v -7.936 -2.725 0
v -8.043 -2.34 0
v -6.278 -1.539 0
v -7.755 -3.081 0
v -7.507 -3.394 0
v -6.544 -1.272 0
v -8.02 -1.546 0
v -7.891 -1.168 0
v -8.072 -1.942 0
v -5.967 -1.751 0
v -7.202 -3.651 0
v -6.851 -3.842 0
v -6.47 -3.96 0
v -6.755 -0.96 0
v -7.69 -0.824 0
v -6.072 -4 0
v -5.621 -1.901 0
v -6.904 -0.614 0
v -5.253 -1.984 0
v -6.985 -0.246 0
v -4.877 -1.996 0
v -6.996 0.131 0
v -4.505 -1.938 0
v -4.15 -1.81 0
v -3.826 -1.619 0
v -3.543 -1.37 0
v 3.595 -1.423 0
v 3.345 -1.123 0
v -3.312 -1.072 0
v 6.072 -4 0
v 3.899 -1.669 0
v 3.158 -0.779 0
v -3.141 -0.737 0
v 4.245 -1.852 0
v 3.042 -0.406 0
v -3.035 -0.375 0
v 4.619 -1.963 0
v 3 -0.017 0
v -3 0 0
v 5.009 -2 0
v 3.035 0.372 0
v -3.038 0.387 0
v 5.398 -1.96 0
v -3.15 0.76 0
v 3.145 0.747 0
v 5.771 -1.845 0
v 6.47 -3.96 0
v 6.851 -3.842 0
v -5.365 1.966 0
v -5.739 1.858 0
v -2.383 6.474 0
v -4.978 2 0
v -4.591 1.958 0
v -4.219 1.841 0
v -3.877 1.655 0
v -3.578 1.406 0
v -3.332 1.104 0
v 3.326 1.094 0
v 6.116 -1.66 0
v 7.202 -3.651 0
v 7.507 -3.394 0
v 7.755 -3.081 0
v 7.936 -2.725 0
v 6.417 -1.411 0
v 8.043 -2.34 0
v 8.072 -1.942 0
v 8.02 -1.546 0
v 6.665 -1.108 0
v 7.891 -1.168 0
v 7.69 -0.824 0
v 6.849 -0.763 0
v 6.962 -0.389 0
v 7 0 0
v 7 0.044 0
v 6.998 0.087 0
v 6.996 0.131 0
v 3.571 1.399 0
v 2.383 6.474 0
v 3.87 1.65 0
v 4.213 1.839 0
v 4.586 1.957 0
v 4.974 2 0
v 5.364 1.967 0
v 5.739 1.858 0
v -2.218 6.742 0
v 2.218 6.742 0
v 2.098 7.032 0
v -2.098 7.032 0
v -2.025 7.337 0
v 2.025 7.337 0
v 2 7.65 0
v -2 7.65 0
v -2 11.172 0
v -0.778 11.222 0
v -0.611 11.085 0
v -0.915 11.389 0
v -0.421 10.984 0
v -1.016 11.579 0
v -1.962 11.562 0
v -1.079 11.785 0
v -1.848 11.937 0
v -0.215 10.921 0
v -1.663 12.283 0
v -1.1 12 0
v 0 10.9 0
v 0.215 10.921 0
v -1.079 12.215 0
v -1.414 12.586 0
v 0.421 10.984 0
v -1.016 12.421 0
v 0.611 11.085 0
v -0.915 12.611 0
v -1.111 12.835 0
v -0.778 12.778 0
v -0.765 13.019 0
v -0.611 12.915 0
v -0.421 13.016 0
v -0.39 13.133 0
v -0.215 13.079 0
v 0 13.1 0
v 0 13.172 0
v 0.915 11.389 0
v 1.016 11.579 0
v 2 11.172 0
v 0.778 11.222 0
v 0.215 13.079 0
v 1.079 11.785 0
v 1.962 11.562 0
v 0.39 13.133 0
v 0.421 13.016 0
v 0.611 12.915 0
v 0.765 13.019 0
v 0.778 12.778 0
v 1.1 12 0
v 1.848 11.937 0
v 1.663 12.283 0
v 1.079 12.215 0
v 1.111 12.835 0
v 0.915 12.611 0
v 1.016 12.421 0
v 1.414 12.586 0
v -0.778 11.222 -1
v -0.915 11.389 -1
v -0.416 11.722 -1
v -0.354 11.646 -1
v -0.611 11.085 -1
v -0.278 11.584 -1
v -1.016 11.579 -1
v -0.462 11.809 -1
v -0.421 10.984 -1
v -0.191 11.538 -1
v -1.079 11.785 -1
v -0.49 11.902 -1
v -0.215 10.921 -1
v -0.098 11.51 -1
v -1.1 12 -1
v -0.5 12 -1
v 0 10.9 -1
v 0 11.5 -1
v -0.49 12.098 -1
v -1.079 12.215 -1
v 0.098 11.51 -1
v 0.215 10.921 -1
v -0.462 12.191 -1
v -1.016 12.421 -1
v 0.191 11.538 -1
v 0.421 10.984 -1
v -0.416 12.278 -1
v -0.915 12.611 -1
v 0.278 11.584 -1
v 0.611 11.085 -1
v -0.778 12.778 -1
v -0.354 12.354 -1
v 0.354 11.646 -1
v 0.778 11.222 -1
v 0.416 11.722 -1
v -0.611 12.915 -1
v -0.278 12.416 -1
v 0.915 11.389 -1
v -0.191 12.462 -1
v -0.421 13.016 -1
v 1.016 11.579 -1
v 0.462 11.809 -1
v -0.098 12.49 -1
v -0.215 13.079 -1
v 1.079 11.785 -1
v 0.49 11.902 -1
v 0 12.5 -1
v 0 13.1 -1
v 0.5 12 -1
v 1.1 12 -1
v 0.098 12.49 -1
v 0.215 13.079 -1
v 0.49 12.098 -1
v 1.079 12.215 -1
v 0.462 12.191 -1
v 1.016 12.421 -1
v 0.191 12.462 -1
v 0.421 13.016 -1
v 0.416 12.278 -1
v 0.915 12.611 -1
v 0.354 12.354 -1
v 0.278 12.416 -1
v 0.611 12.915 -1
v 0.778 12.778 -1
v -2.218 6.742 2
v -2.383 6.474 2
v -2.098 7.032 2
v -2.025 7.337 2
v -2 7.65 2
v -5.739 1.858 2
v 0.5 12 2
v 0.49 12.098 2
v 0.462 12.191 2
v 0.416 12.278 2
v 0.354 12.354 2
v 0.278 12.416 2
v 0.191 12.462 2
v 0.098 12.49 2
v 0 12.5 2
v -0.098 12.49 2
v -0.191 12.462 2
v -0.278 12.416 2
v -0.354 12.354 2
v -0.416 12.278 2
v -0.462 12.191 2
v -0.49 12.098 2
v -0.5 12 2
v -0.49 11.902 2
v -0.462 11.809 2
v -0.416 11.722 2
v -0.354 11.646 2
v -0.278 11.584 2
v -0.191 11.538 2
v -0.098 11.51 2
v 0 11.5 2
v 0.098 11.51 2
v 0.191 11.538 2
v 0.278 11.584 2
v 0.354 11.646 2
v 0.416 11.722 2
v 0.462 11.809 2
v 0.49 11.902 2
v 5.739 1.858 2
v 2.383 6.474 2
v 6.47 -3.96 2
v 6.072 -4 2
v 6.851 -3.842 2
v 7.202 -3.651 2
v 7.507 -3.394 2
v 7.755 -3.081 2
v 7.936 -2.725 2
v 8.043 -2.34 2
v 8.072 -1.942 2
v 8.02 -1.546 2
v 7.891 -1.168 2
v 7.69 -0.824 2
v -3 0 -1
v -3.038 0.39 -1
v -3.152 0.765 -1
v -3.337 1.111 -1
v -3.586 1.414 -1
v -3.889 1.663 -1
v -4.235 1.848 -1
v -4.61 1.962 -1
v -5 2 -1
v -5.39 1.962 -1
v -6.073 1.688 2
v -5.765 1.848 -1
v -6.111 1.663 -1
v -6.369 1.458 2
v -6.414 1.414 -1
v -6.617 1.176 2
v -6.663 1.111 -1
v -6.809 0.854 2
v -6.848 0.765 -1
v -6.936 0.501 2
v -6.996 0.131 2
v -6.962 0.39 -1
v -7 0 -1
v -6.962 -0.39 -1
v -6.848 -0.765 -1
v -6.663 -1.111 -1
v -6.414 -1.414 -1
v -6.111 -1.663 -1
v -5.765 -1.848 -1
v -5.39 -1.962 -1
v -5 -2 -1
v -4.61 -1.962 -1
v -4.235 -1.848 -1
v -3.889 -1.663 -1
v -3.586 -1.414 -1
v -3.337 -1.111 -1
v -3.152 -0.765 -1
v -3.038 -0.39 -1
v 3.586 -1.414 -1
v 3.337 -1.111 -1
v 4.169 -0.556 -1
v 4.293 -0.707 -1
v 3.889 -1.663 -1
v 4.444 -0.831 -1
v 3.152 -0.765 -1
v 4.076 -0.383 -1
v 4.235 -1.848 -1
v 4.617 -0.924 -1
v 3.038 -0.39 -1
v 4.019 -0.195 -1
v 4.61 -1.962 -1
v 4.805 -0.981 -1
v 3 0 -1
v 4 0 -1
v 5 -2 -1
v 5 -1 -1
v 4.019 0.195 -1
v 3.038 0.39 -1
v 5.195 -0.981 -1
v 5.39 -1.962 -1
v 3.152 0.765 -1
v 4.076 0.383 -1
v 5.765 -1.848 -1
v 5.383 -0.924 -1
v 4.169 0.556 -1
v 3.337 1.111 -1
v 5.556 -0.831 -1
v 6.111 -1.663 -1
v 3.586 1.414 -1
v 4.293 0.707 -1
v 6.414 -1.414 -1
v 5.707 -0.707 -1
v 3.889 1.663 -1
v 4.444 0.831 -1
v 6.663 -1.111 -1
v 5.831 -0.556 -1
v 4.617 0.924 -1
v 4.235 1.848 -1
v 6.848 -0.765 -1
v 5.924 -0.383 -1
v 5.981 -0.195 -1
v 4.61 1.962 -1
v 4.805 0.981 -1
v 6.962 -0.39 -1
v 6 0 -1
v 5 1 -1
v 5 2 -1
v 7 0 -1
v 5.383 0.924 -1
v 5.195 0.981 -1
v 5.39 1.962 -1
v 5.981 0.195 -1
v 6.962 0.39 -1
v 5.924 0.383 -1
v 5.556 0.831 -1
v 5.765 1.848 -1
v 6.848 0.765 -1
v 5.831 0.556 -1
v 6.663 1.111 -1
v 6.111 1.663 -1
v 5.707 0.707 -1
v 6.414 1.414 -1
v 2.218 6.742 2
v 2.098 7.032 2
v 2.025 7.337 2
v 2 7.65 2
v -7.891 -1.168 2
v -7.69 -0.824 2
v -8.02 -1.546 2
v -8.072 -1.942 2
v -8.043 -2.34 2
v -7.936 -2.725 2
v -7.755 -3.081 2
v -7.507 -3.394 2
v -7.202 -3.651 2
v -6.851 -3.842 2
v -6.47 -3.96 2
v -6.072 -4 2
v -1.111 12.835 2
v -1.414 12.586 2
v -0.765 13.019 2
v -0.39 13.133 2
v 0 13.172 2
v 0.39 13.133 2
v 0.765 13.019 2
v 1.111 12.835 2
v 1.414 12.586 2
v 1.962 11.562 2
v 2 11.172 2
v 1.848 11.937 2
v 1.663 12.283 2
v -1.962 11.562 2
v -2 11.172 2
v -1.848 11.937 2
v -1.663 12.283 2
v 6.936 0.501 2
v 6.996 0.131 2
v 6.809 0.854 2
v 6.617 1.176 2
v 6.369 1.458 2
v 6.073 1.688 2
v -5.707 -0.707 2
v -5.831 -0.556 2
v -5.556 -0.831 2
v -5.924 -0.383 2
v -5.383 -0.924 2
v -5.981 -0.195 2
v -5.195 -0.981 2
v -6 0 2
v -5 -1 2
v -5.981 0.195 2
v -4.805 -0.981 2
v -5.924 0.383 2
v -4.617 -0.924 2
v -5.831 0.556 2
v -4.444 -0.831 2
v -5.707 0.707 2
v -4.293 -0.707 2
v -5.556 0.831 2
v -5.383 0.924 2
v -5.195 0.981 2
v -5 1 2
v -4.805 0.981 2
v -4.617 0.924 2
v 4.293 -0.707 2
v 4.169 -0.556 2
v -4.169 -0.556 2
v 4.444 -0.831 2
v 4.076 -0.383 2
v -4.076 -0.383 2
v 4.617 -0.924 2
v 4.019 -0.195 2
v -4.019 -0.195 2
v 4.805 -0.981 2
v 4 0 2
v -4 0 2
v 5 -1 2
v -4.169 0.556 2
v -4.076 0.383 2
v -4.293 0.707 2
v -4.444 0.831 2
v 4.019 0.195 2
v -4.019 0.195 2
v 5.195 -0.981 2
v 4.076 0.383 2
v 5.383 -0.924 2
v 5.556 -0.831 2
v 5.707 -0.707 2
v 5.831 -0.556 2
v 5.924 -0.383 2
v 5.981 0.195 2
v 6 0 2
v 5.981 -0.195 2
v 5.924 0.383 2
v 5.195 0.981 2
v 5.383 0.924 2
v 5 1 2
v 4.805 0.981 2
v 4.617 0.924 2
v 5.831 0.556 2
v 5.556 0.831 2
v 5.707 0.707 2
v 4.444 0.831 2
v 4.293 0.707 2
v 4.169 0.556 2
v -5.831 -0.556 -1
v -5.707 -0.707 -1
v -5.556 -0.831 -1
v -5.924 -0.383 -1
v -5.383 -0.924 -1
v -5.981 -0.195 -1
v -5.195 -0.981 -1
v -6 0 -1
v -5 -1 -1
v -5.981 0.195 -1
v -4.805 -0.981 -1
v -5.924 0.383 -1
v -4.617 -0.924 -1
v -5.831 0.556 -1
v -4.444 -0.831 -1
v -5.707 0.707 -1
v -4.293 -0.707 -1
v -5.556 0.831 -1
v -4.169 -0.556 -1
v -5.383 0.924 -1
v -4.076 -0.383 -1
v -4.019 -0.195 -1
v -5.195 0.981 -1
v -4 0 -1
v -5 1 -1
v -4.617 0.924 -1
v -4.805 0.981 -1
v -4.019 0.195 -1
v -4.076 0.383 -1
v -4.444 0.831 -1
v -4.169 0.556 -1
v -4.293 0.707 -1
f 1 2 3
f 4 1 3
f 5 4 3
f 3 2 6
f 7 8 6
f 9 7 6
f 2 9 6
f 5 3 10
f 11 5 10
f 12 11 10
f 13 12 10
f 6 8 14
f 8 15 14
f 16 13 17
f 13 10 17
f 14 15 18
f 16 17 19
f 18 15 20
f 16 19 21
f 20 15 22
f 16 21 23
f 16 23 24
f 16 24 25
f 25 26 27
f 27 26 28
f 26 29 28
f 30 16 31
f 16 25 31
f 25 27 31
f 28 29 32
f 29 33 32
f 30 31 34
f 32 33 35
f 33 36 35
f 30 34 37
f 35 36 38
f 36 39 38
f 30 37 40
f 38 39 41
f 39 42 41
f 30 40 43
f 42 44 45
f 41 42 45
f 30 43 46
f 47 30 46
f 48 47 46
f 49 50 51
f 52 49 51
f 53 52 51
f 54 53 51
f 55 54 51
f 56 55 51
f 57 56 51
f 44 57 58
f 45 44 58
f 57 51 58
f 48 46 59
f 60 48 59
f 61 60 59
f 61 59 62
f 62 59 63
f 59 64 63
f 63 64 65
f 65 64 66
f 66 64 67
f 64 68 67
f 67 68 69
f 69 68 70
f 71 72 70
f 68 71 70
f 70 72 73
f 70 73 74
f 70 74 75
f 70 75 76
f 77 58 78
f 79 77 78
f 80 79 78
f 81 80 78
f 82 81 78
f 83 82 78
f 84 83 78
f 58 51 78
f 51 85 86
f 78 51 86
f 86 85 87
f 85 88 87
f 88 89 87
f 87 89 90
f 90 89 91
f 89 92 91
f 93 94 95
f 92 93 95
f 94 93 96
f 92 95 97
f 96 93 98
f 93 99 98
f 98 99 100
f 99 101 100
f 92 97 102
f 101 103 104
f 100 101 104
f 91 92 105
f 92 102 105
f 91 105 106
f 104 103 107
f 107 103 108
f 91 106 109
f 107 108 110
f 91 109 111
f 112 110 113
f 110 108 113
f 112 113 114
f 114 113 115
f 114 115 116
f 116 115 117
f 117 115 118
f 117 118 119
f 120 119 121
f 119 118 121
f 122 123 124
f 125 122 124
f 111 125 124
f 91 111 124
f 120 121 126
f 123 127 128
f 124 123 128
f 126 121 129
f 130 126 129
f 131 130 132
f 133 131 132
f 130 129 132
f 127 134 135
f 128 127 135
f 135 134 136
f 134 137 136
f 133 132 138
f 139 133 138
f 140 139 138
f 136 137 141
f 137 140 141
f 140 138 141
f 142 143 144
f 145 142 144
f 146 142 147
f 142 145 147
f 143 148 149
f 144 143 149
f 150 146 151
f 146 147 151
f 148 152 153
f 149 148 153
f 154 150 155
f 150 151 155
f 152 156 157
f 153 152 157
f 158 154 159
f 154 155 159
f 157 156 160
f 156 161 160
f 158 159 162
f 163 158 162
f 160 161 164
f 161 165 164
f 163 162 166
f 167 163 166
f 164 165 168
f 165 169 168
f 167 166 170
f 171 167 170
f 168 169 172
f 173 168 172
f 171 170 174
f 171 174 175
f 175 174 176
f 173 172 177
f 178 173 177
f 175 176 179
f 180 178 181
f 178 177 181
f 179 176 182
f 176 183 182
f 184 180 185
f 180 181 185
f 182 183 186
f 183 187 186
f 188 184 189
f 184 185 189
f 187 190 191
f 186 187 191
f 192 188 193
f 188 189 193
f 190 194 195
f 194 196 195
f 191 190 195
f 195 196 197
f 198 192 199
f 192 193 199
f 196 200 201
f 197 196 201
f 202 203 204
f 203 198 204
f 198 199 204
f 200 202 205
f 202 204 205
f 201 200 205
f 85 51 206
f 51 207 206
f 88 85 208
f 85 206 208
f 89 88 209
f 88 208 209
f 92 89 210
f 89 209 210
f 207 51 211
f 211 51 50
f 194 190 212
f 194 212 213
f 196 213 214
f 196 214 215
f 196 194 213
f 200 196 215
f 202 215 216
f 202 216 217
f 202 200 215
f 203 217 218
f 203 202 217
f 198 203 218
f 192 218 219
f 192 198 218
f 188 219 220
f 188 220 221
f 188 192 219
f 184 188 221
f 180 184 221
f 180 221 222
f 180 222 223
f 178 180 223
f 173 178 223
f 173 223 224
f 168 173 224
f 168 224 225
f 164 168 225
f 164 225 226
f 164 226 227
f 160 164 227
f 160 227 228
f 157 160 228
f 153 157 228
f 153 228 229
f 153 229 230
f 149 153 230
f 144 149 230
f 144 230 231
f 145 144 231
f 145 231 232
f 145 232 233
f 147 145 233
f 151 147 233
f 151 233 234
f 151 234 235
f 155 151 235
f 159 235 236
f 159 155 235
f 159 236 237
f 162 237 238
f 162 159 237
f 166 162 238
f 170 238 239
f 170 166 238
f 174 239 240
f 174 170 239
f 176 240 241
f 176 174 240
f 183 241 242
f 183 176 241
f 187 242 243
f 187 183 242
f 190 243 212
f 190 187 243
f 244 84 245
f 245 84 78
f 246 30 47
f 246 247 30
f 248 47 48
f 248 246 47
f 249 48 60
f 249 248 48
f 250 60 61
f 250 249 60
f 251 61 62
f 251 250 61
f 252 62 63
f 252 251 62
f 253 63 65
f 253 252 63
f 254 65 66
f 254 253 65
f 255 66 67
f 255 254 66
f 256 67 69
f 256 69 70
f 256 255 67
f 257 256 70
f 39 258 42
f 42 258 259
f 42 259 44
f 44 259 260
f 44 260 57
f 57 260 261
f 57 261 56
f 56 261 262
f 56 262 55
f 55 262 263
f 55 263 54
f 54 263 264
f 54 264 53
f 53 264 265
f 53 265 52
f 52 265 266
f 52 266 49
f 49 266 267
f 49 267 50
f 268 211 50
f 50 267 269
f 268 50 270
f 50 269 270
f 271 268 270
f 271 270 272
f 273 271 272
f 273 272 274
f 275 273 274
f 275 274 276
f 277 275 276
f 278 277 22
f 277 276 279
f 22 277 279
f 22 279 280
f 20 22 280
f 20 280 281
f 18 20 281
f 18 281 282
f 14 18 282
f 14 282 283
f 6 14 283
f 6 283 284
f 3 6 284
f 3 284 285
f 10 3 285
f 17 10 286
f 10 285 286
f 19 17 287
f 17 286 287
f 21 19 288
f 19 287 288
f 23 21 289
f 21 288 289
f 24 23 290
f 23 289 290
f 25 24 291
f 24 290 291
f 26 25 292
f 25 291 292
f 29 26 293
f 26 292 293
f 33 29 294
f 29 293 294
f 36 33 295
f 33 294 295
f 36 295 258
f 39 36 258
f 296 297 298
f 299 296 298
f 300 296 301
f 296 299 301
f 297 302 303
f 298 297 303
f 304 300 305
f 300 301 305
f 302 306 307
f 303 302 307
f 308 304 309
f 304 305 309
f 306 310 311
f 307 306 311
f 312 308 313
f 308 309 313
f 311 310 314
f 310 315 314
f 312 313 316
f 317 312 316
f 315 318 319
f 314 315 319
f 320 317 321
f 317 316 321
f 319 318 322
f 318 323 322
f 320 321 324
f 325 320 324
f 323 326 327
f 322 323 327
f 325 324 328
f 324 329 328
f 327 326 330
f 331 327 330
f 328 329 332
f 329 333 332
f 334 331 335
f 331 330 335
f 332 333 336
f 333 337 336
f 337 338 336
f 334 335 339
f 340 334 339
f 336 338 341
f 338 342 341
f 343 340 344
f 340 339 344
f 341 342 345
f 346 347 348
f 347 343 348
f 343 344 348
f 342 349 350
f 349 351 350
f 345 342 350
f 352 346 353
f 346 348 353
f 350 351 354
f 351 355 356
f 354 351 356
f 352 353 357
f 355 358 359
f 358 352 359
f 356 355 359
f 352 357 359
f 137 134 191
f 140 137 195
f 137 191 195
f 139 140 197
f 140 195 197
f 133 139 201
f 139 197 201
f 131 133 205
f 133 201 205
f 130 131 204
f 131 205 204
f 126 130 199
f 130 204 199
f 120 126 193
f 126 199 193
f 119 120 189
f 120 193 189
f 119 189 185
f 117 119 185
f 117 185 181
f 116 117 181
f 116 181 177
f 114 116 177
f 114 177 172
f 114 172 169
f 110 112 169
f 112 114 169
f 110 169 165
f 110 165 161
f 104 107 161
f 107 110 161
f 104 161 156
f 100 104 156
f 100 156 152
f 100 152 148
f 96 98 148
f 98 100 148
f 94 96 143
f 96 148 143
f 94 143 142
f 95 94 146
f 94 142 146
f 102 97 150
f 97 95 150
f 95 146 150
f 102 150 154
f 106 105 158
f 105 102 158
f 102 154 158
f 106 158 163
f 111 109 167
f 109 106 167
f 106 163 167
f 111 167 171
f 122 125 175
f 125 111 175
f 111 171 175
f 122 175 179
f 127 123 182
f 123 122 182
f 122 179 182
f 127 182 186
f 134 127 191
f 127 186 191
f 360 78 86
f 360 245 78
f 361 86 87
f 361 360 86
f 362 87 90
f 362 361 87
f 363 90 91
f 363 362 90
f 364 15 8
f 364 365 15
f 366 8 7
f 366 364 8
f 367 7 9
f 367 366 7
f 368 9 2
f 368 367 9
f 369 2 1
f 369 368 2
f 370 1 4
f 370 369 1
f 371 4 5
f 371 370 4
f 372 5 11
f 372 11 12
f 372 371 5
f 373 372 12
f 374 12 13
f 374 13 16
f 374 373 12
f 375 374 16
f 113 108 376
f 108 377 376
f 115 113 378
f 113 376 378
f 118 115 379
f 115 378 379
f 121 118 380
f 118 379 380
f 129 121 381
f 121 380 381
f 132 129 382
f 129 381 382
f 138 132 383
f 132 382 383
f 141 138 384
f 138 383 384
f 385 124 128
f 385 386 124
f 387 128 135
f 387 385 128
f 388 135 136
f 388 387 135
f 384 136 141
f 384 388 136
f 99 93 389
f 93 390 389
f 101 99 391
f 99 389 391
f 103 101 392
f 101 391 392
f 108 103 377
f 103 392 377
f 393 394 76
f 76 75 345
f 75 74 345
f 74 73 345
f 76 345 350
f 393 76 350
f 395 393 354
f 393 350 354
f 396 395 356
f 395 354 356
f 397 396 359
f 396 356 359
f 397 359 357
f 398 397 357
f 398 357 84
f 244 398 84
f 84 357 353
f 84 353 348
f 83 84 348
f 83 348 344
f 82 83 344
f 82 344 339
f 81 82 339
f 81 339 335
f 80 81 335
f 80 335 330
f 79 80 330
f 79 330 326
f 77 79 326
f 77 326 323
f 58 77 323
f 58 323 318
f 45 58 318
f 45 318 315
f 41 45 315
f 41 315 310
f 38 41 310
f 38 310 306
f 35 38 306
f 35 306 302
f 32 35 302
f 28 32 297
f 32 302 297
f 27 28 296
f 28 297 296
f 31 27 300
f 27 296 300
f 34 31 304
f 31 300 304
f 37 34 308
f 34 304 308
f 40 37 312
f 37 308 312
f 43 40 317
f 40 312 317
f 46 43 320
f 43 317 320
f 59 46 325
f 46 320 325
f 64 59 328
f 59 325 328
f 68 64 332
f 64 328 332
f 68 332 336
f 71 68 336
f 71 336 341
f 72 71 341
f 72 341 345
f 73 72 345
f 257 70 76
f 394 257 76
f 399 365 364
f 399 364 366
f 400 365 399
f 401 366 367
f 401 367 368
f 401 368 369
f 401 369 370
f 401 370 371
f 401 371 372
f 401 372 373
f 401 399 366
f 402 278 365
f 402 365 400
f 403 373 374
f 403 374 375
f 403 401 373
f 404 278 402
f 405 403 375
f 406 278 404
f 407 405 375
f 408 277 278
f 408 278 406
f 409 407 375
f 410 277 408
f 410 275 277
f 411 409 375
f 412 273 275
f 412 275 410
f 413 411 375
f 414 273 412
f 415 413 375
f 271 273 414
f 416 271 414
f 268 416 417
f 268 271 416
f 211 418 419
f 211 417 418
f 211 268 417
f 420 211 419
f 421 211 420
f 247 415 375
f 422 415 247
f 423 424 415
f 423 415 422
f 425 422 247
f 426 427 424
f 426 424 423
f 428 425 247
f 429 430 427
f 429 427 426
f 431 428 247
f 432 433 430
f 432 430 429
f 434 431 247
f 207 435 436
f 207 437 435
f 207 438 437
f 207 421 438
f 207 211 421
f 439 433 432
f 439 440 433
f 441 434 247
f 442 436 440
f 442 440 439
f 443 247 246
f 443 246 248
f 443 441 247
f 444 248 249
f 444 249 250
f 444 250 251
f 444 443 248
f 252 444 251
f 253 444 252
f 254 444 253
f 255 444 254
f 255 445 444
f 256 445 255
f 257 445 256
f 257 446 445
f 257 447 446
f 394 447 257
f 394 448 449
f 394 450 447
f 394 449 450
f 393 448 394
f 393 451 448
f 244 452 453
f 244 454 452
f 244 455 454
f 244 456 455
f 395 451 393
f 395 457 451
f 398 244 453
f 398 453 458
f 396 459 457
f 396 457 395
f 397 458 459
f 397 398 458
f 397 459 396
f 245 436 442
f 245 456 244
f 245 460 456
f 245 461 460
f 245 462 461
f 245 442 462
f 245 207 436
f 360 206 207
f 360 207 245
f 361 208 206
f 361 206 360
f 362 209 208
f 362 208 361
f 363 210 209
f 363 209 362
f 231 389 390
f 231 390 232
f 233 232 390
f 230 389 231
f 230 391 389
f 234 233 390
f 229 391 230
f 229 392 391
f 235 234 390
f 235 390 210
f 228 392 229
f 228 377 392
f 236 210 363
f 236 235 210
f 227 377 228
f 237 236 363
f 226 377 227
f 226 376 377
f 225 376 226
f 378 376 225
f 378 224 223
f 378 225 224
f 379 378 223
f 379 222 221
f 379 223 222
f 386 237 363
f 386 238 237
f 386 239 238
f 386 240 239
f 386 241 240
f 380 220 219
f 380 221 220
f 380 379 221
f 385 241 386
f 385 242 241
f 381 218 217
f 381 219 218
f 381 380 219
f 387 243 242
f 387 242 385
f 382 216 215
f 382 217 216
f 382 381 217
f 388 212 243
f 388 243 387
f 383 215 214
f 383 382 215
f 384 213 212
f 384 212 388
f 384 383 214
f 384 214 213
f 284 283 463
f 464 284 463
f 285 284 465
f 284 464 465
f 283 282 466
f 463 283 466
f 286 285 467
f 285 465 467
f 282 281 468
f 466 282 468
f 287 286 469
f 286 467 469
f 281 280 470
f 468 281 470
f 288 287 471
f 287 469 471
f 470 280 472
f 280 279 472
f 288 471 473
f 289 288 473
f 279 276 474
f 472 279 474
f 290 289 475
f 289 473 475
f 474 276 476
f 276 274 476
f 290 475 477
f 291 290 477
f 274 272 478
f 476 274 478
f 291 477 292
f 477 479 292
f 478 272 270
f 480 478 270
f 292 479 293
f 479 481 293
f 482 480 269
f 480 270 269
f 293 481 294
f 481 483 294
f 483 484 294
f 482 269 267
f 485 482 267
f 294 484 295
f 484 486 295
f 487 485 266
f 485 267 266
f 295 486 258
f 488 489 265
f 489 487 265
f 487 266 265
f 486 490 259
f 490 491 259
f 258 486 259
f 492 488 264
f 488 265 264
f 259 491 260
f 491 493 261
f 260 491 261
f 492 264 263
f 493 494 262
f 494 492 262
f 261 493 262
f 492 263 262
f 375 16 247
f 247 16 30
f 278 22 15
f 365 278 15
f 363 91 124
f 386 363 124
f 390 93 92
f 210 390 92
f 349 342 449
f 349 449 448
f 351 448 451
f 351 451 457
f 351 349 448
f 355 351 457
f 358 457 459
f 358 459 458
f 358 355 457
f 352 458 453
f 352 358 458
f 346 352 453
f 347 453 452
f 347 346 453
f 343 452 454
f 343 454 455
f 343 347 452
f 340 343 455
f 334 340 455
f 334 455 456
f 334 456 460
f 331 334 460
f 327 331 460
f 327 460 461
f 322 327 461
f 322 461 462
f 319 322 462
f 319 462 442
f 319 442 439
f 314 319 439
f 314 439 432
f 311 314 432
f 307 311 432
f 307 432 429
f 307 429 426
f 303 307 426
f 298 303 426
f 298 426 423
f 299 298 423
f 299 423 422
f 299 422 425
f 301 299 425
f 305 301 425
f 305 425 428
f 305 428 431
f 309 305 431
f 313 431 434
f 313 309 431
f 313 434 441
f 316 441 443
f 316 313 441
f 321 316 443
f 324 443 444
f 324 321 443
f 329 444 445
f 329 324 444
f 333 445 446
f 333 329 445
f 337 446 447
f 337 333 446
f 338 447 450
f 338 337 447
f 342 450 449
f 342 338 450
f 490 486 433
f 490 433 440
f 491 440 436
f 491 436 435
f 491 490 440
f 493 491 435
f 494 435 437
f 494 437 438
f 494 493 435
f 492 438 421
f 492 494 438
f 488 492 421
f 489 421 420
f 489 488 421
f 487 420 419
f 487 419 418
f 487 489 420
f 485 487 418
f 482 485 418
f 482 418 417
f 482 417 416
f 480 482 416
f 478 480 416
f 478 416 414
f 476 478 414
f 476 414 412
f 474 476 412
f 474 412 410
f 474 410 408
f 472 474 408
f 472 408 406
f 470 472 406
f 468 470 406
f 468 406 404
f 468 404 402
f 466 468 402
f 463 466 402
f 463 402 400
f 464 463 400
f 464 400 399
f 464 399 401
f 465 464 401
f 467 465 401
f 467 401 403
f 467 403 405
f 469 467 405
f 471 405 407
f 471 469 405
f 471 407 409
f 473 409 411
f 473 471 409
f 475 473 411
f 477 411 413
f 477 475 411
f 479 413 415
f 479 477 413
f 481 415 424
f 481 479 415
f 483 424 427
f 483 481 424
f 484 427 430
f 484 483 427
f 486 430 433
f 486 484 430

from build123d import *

# Parameters (mm, degrees)
SKETCH_1_R      = 1
SKETCH_1_R_2    = 0.5
EXTRUDE_1_DEPTH = 2
FILLET_1_R      = 2
FILLET_2_R      = 2
EXTRUDE_START   = -3
SKETCH_3_R      = 1.1
SKETCH_3_R_2    = 0.5
SKETCH_3_R_3    = 2
SKETCH_3_R_4    = 1
EXTRUDE_3_DEPTH = 3


with BuildPart() as part:
    # 草图1 → 凸台-拉伸1 (new body)
    with BuildSketch(Plane.XY):
        Polygon((-10, -4), (10, -4), (2, 7), (2, 12), (0, 14), (-2, 12), (-2, 7), align=None)
        with Locations((-5, 0)):
            Circle(SKETCH_1_R, mode=Mode.SUBTRACT)
        with Locations((5, 0)):
            Circle(SKETCH_1_R, mode=Mode.SUBTRACT)
        with Locations((0, 12)):
            Circle(SKETCH_1_R_2, mode=Mode.SUBTRACT)
    extrude(amount=EXTRUDE_1_DEPTH)

    # 圆角1
    fillet_1_edges = [part.edges().sort_by_distance(p)[0] for p in [
        (0, 14, 1),
        (2, 12, 1),
        (-2, 12, 1),
        (-2, 7, 1),
        (2, 7, 1),
    ]]
    fillet(fillet_1_edges, radius=FILLET_1_R - 0.0001)  # a hair under: the kernel refuses the full size

    # 圆角2
    fillet_2_edges = [part.edges().sort_by_distance(p)[0] for p in [
        (10, -4, 1),
        (-10, -4, 1),
    ]]
    fillet(fillet_2_edges, radius=FILLET_2_R)

    # 草图3 → 凸台-拉伸3 (add)
    # profile 1 of 3: a face of its own
    with BuildSketch(Plane.XY.offset(2).offset(EXTRUDE_START)):
        with Locations((0, 12)):
            Circle(SKETCH_3_R)
        with Locations((0, 12)):
            Circle(SKETCH_3_R_2, mode=Mode.SUBTRACT)
    # profile 2 of 3: a face of its own
    with BuildSketch(Plane.XY.offset(2).offset(EXTRUDE_START)):
        with Locations((-5, 0)):
            Circle(SKETCH_3_R_3)
        with Locations((-5, 0)):
            Circle(SKETCH_3_R_4, mode=Mode.SUBTRACT)
    # profile 3 of 3: a face of its own
    with BuildSketch(Plane.XY.offset(2).offset(EXTRUDE_START)):
        with Locations((5, 0)):
            Circle(SKETCH_3_R_3)
        with Locations((5, 0)):
            Circle(SKETCH_3_R_4, mode=Mode.SUBTRACT)
    extrude(amount=EXTRUDE_3_DEPTH)


solid = part.part
